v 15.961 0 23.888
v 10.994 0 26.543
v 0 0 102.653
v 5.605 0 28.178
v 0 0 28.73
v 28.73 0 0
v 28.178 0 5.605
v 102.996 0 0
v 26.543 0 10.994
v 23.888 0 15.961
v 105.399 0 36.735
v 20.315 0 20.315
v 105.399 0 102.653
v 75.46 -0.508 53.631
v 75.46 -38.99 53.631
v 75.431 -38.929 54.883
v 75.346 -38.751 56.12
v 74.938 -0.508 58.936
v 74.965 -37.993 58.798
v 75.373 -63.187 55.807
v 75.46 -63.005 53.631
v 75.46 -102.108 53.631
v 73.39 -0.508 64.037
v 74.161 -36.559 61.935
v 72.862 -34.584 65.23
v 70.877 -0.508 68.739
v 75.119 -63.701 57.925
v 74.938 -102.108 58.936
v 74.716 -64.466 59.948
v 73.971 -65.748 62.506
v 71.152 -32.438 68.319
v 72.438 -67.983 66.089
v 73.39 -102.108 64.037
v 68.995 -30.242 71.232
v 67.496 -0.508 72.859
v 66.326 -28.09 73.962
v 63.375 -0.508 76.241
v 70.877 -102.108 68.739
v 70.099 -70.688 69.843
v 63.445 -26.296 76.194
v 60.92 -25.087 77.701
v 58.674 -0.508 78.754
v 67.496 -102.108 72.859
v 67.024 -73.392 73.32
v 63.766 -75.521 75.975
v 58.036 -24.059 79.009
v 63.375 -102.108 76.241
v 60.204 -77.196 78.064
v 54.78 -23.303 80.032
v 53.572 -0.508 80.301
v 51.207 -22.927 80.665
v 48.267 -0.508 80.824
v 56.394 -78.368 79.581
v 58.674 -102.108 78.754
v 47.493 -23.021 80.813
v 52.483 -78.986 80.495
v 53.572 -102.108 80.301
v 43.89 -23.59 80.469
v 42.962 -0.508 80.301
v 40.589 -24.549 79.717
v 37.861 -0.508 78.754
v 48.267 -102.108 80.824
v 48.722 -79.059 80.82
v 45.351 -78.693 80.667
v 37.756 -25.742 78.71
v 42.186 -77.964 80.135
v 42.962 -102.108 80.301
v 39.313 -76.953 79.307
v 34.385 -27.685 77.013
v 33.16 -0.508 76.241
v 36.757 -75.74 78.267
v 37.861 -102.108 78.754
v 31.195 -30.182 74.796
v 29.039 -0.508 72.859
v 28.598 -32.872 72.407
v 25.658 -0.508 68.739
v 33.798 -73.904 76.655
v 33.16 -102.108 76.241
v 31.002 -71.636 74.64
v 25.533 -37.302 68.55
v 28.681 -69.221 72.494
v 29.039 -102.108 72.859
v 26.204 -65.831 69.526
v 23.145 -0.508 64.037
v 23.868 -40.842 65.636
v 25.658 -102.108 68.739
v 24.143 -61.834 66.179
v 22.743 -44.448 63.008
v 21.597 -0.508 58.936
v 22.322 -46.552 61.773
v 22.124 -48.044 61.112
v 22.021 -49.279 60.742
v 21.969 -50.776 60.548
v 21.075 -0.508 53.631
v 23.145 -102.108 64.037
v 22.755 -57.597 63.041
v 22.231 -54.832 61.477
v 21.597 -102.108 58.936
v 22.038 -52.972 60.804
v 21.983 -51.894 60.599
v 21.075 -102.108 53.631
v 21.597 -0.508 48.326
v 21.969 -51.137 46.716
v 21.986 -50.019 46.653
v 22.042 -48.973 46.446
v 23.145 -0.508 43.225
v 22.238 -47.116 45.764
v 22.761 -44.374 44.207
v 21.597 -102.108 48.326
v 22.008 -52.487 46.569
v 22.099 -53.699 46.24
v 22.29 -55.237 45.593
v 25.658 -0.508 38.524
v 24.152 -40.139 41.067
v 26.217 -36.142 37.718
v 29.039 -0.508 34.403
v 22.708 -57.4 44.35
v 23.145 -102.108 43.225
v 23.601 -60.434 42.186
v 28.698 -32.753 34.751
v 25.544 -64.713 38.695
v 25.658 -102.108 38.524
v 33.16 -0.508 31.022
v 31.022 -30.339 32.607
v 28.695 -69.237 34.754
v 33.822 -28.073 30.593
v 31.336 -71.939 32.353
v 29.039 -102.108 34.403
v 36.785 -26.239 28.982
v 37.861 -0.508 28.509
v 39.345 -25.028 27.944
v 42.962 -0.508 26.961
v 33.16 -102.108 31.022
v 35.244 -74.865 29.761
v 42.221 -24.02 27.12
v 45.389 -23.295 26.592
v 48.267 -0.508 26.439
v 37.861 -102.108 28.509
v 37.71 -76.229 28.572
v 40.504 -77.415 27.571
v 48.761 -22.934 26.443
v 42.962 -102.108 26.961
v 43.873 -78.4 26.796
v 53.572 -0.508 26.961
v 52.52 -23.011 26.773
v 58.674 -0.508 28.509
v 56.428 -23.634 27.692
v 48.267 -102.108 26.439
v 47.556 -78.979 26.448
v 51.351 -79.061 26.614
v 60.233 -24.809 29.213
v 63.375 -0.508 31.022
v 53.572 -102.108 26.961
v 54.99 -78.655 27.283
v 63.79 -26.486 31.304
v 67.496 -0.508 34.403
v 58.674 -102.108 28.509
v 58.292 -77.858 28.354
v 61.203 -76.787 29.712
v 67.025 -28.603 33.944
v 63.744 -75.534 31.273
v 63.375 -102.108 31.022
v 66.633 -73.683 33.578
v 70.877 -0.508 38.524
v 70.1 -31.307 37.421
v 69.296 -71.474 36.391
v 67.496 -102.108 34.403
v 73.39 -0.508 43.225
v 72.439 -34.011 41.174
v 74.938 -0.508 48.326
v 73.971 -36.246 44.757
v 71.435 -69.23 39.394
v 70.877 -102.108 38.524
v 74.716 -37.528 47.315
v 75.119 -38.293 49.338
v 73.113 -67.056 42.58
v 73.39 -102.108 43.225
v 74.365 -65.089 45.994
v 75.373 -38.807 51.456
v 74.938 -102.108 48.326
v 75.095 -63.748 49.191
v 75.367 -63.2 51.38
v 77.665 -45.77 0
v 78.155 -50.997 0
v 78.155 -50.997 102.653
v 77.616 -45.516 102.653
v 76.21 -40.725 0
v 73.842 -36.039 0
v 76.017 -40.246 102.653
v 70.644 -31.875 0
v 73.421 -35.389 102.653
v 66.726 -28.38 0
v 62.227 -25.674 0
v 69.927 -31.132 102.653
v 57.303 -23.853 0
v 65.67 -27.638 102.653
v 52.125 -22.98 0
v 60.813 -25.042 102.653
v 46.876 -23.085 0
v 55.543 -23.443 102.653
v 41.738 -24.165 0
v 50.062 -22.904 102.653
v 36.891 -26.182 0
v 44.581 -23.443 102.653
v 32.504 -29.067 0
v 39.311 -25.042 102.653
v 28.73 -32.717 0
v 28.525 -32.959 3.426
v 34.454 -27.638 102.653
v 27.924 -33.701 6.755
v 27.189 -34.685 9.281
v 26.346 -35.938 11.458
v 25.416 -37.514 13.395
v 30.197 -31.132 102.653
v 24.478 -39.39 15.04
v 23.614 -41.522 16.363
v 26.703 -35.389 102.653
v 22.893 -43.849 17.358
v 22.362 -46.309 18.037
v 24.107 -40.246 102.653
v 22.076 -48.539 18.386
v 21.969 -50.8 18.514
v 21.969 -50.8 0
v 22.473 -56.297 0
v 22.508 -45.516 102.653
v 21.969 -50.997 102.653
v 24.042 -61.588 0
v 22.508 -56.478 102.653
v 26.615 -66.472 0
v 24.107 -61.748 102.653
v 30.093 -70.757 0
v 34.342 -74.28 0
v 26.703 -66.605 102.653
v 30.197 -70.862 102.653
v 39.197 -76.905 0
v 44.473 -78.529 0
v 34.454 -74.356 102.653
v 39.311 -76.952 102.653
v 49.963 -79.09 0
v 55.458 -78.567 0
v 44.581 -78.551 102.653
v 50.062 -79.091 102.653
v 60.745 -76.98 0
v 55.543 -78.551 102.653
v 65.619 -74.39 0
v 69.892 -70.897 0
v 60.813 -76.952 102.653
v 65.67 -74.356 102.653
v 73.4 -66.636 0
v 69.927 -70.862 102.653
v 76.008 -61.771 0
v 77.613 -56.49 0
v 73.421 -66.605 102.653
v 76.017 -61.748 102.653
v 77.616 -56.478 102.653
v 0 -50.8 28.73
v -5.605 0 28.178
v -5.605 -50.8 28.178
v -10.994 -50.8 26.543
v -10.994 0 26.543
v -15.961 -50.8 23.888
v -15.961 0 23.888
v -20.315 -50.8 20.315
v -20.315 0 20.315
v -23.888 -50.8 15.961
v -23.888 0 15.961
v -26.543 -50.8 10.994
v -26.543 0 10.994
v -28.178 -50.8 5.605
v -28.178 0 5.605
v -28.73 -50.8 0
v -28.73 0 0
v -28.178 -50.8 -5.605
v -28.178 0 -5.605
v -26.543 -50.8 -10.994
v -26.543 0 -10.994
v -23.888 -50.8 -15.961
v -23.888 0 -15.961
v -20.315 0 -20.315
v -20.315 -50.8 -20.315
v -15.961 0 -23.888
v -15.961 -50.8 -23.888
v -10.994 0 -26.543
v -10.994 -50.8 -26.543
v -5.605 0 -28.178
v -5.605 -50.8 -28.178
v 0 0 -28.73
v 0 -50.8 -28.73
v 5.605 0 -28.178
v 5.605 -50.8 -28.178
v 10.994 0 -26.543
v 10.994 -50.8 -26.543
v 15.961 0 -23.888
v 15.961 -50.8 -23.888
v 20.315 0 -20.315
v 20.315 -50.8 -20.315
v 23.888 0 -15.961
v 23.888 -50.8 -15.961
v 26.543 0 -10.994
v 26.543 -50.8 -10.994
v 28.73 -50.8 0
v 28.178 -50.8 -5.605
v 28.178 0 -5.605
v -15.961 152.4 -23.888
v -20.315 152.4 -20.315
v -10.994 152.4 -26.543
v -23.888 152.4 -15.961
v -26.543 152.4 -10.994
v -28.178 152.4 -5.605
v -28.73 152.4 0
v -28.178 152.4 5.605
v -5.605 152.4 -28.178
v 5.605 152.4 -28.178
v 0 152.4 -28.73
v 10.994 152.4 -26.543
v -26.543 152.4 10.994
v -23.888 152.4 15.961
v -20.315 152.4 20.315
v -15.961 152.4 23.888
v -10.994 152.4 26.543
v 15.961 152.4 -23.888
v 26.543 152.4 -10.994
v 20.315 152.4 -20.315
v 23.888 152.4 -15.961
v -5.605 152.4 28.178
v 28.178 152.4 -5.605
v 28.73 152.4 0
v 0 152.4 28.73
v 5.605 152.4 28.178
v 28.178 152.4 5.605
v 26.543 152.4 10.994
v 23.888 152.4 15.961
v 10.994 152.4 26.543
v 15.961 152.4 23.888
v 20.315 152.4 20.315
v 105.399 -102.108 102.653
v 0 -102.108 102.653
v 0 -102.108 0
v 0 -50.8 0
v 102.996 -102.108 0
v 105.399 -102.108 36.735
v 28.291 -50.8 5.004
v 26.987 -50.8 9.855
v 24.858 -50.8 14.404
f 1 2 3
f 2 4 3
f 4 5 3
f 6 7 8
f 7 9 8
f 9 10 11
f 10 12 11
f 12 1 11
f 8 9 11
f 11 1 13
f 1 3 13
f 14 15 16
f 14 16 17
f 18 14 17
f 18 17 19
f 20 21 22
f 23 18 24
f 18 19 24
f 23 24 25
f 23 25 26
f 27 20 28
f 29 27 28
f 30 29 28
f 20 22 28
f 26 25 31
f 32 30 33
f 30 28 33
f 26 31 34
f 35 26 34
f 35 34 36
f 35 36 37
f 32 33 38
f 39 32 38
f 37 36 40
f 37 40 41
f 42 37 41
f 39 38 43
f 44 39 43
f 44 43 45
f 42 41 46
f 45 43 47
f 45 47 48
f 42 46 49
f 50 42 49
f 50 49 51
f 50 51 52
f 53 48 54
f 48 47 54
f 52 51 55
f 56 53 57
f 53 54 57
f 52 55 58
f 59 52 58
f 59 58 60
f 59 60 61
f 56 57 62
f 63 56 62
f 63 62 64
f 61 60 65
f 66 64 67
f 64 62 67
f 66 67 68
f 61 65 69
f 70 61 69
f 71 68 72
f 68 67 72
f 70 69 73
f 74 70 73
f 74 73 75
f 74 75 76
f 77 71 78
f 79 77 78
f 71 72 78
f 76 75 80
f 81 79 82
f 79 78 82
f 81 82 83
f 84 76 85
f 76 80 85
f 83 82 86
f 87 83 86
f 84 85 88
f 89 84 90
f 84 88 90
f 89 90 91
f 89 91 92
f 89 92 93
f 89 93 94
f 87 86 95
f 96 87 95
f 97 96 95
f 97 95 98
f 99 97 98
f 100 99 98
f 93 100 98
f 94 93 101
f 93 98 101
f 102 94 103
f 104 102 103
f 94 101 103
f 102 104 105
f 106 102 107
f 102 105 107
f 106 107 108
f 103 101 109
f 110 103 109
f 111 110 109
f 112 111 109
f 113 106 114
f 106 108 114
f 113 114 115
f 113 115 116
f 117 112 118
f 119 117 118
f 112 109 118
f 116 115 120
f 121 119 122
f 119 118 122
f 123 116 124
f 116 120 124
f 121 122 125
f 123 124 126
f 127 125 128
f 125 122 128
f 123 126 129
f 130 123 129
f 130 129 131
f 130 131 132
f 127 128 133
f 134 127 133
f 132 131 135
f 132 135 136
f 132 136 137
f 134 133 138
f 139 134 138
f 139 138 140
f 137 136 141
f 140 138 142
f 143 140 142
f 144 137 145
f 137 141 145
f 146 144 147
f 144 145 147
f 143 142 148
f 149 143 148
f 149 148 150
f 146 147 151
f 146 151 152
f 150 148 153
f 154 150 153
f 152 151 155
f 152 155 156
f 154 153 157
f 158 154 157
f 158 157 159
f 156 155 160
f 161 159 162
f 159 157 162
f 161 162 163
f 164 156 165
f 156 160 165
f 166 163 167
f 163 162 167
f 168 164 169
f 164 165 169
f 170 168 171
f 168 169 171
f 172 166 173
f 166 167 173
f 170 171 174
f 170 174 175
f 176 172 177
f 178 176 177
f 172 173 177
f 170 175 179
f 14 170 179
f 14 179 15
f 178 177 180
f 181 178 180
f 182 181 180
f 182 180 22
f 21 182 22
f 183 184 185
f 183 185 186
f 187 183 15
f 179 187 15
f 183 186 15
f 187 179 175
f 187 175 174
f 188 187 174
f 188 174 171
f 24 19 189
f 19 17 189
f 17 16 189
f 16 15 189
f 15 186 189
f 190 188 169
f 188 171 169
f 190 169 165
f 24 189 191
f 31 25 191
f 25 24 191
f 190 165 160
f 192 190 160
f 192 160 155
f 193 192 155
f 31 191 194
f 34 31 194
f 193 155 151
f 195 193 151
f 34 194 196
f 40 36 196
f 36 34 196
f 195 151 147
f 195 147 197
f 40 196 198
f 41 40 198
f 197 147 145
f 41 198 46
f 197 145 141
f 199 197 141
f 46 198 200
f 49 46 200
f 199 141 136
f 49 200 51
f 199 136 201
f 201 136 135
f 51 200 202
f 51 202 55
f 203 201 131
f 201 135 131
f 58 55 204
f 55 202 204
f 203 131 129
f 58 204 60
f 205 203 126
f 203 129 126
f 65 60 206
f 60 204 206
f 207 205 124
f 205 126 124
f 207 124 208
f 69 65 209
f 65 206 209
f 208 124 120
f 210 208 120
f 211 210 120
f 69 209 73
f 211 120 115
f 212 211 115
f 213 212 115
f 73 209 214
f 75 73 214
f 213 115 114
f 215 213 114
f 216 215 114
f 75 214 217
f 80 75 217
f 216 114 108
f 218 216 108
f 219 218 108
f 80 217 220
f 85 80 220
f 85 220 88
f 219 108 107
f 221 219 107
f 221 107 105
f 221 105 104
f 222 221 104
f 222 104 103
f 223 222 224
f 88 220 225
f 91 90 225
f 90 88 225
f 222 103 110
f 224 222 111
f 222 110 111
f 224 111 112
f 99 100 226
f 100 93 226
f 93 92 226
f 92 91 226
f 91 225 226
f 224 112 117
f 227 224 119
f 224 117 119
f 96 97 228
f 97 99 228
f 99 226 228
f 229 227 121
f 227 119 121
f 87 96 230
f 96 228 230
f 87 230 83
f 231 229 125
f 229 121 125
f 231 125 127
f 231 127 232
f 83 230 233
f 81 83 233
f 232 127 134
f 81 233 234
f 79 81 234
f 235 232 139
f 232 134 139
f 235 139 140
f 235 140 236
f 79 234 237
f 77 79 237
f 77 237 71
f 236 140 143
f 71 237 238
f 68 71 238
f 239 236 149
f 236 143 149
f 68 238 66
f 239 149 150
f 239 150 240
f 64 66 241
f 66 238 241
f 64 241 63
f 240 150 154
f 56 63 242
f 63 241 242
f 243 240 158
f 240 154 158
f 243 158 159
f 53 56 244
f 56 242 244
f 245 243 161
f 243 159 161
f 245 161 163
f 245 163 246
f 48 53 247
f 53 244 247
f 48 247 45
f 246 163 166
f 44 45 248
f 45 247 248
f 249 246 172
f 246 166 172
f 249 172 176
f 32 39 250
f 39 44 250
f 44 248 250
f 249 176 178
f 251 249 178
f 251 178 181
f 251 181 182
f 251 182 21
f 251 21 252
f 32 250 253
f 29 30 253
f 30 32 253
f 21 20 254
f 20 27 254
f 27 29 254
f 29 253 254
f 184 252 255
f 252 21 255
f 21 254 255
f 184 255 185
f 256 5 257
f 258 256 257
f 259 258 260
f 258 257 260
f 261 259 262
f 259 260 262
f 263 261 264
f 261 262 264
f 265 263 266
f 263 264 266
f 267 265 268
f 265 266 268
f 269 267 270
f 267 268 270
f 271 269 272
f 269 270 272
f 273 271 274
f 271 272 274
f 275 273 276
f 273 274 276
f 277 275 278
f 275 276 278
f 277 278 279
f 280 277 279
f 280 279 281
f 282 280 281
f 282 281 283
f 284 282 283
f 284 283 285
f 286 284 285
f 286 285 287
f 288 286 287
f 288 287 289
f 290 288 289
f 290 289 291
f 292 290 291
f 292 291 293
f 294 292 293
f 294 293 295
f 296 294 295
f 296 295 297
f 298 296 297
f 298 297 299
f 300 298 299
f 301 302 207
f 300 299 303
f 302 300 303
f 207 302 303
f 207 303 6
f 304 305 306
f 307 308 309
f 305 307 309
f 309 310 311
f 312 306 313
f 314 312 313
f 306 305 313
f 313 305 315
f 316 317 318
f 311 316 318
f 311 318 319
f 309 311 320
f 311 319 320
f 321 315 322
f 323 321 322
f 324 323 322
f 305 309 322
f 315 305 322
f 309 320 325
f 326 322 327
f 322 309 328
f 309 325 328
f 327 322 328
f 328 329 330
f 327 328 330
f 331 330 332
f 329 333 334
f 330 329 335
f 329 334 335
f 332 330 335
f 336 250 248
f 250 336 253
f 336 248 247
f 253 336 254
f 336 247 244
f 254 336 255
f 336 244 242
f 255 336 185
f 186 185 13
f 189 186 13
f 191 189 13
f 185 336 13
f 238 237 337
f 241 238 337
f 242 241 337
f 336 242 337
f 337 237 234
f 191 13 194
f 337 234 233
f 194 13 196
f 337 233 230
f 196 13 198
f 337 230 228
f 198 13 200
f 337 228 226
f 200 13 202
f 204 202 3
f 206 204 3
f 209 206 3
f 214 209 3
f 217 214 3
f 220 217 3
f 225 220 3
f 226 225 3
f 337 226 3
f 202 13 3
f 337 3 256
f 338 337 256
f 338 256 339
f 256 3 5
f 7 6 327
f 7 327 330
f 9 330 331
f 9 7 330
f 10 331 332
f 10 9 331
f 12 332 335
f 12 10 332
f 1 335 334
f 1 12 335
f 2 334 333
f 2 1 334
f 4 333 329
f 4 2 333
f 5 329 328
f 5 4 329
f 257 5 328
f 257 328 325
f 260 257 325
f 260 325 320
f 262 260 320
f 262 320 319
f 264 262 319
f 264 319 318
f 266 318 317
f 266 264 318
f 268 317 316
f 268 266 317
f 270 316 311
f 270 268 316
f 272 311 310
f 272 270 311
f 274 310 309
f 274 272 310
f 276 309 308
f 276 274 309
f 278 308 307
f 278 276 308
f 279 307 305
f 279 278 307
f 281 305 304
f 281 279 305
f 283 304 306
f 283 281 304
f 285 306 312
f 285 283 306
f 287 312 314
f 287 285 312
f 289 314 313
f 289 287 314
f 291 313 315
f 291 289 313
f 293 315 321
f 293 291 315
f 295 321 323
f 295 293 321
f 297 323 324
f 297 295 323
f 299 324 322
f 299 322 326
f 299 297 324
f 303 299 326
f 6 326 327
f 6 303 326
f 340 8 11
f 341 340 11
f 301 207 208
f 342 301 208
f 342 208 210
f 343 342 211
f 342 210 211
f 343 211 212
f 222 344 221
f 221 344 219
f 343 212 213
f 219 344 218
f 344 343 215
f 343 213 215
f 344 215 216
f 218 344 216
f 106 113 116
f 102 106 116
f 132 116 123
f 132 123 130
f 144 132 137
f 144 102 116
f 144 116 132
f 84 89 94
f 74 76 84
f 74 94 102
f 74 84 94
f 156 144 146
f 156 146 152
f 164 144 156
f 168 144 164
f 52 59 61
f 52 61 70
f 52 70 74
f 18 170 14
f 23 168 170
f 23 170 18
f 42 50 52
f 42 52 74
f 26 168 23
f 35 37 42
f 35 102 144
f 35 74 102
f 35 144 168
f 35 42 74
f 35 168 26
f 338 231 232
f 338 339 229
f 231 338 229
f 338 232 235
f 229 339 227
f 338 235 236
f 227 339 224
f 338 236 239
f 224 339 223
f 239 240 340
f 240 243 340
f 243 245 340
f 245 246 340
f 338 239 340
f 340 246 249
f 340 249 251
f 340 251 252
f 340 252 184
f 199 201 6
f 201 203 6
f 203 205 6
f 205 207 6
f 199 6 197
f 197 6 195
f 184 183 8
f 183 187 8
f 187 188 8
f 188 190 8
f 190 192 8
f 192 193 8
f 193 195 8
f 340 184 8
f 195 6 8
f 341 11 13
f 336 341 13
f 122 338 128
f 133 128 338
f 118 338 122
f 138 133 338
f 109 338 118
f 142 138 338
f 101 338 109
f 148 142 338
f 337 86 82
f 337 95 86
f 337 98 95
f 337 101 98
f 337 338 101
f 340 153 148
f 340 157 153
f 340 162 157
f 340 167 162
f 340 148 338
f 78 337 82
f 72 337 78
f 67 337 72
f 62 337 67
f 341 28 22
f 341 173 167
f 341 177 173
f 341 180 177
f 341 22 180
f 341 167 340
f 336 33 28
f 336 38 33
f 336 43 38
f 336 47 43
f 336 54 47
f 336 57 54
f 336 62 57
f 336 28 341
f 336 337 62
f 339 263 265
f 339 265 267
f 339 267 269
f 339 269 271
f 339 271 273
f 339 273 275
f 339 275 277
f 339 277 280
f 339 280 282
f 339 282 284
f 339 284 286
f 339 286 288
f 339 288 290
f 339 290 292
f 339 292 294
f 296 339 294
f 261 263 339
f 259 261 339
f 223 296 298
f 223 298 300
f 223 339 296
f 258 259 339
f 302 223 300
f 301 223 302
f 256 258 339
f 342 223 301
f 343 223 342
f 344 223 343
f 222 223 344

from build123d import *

# Parameters (mm, degrees)
F1_DEPTH      = 102.108
F2_R          = 28.09345
F3_DEPTH      = 101.6
F3_FACE_R     = 28.09345
F4_DEPTH      = 101.6
F5_R          = 27.192534
F6_DEPTH      = 101.6
F7_R          = 28.729742
F8_DEPTH      = 50.8
F8_DEPTH_BACK = 152.4


with BuildPart() as f1:
    # F0 (on Front) → F1 (new body)
    with BuildSketch(Plane.XZ):
        Polygon((0, 102.652691), (0, 0), (99.562824, 0), (102.996022, 0), (105.399251, 36.73524), (105.399251, 48.408125), (105.399251, 63.514203), (105.399251, 102.652691), align=None)
    extrude(amount=F1_DEPTH)

    # F2 (on face) → F3 (cut)
    with BuildSketch(Plane.XY.offset(102.652691)):
        with Locations((50.061982, -50.997104)):
            Circle(F2_R)
    extrude(amount=-F3_DEPTH, mode=Mode.SUBTRACT)

    # F3_face (on face) → F4 (cut)
    with BuildSketch(Plane(origin=(50.061982, -50.997104, 1.052691), x_dir=(1, 0, 0), z_dir=(0, 0, 1))):
        Circle(F3_FACE_R)
    extrude(amount=-F4_DEPTH, mode=Mode.SUBTRACT)

    # F5 (on face) → F6 (cut)
    with BuildSketch(Plane.XZ.offset(102.108)):
        with Locations((48.267499, 53.63135)):
            Circle(F5_R)
    extrude(amount=-F6_DEPTH, mode=Mode.SUBTRACT)

    # F7 (on Front) → F8 (join, two sides)
    with BuildSketch(Plane.XZ) as f8_sk:
        Circle(F7_R)
    extrude(amount=F8_DEPTH)
    extrude(f8_sk.sketch, amount=-F8_DEPTH_BACK)


solid = f1.part
